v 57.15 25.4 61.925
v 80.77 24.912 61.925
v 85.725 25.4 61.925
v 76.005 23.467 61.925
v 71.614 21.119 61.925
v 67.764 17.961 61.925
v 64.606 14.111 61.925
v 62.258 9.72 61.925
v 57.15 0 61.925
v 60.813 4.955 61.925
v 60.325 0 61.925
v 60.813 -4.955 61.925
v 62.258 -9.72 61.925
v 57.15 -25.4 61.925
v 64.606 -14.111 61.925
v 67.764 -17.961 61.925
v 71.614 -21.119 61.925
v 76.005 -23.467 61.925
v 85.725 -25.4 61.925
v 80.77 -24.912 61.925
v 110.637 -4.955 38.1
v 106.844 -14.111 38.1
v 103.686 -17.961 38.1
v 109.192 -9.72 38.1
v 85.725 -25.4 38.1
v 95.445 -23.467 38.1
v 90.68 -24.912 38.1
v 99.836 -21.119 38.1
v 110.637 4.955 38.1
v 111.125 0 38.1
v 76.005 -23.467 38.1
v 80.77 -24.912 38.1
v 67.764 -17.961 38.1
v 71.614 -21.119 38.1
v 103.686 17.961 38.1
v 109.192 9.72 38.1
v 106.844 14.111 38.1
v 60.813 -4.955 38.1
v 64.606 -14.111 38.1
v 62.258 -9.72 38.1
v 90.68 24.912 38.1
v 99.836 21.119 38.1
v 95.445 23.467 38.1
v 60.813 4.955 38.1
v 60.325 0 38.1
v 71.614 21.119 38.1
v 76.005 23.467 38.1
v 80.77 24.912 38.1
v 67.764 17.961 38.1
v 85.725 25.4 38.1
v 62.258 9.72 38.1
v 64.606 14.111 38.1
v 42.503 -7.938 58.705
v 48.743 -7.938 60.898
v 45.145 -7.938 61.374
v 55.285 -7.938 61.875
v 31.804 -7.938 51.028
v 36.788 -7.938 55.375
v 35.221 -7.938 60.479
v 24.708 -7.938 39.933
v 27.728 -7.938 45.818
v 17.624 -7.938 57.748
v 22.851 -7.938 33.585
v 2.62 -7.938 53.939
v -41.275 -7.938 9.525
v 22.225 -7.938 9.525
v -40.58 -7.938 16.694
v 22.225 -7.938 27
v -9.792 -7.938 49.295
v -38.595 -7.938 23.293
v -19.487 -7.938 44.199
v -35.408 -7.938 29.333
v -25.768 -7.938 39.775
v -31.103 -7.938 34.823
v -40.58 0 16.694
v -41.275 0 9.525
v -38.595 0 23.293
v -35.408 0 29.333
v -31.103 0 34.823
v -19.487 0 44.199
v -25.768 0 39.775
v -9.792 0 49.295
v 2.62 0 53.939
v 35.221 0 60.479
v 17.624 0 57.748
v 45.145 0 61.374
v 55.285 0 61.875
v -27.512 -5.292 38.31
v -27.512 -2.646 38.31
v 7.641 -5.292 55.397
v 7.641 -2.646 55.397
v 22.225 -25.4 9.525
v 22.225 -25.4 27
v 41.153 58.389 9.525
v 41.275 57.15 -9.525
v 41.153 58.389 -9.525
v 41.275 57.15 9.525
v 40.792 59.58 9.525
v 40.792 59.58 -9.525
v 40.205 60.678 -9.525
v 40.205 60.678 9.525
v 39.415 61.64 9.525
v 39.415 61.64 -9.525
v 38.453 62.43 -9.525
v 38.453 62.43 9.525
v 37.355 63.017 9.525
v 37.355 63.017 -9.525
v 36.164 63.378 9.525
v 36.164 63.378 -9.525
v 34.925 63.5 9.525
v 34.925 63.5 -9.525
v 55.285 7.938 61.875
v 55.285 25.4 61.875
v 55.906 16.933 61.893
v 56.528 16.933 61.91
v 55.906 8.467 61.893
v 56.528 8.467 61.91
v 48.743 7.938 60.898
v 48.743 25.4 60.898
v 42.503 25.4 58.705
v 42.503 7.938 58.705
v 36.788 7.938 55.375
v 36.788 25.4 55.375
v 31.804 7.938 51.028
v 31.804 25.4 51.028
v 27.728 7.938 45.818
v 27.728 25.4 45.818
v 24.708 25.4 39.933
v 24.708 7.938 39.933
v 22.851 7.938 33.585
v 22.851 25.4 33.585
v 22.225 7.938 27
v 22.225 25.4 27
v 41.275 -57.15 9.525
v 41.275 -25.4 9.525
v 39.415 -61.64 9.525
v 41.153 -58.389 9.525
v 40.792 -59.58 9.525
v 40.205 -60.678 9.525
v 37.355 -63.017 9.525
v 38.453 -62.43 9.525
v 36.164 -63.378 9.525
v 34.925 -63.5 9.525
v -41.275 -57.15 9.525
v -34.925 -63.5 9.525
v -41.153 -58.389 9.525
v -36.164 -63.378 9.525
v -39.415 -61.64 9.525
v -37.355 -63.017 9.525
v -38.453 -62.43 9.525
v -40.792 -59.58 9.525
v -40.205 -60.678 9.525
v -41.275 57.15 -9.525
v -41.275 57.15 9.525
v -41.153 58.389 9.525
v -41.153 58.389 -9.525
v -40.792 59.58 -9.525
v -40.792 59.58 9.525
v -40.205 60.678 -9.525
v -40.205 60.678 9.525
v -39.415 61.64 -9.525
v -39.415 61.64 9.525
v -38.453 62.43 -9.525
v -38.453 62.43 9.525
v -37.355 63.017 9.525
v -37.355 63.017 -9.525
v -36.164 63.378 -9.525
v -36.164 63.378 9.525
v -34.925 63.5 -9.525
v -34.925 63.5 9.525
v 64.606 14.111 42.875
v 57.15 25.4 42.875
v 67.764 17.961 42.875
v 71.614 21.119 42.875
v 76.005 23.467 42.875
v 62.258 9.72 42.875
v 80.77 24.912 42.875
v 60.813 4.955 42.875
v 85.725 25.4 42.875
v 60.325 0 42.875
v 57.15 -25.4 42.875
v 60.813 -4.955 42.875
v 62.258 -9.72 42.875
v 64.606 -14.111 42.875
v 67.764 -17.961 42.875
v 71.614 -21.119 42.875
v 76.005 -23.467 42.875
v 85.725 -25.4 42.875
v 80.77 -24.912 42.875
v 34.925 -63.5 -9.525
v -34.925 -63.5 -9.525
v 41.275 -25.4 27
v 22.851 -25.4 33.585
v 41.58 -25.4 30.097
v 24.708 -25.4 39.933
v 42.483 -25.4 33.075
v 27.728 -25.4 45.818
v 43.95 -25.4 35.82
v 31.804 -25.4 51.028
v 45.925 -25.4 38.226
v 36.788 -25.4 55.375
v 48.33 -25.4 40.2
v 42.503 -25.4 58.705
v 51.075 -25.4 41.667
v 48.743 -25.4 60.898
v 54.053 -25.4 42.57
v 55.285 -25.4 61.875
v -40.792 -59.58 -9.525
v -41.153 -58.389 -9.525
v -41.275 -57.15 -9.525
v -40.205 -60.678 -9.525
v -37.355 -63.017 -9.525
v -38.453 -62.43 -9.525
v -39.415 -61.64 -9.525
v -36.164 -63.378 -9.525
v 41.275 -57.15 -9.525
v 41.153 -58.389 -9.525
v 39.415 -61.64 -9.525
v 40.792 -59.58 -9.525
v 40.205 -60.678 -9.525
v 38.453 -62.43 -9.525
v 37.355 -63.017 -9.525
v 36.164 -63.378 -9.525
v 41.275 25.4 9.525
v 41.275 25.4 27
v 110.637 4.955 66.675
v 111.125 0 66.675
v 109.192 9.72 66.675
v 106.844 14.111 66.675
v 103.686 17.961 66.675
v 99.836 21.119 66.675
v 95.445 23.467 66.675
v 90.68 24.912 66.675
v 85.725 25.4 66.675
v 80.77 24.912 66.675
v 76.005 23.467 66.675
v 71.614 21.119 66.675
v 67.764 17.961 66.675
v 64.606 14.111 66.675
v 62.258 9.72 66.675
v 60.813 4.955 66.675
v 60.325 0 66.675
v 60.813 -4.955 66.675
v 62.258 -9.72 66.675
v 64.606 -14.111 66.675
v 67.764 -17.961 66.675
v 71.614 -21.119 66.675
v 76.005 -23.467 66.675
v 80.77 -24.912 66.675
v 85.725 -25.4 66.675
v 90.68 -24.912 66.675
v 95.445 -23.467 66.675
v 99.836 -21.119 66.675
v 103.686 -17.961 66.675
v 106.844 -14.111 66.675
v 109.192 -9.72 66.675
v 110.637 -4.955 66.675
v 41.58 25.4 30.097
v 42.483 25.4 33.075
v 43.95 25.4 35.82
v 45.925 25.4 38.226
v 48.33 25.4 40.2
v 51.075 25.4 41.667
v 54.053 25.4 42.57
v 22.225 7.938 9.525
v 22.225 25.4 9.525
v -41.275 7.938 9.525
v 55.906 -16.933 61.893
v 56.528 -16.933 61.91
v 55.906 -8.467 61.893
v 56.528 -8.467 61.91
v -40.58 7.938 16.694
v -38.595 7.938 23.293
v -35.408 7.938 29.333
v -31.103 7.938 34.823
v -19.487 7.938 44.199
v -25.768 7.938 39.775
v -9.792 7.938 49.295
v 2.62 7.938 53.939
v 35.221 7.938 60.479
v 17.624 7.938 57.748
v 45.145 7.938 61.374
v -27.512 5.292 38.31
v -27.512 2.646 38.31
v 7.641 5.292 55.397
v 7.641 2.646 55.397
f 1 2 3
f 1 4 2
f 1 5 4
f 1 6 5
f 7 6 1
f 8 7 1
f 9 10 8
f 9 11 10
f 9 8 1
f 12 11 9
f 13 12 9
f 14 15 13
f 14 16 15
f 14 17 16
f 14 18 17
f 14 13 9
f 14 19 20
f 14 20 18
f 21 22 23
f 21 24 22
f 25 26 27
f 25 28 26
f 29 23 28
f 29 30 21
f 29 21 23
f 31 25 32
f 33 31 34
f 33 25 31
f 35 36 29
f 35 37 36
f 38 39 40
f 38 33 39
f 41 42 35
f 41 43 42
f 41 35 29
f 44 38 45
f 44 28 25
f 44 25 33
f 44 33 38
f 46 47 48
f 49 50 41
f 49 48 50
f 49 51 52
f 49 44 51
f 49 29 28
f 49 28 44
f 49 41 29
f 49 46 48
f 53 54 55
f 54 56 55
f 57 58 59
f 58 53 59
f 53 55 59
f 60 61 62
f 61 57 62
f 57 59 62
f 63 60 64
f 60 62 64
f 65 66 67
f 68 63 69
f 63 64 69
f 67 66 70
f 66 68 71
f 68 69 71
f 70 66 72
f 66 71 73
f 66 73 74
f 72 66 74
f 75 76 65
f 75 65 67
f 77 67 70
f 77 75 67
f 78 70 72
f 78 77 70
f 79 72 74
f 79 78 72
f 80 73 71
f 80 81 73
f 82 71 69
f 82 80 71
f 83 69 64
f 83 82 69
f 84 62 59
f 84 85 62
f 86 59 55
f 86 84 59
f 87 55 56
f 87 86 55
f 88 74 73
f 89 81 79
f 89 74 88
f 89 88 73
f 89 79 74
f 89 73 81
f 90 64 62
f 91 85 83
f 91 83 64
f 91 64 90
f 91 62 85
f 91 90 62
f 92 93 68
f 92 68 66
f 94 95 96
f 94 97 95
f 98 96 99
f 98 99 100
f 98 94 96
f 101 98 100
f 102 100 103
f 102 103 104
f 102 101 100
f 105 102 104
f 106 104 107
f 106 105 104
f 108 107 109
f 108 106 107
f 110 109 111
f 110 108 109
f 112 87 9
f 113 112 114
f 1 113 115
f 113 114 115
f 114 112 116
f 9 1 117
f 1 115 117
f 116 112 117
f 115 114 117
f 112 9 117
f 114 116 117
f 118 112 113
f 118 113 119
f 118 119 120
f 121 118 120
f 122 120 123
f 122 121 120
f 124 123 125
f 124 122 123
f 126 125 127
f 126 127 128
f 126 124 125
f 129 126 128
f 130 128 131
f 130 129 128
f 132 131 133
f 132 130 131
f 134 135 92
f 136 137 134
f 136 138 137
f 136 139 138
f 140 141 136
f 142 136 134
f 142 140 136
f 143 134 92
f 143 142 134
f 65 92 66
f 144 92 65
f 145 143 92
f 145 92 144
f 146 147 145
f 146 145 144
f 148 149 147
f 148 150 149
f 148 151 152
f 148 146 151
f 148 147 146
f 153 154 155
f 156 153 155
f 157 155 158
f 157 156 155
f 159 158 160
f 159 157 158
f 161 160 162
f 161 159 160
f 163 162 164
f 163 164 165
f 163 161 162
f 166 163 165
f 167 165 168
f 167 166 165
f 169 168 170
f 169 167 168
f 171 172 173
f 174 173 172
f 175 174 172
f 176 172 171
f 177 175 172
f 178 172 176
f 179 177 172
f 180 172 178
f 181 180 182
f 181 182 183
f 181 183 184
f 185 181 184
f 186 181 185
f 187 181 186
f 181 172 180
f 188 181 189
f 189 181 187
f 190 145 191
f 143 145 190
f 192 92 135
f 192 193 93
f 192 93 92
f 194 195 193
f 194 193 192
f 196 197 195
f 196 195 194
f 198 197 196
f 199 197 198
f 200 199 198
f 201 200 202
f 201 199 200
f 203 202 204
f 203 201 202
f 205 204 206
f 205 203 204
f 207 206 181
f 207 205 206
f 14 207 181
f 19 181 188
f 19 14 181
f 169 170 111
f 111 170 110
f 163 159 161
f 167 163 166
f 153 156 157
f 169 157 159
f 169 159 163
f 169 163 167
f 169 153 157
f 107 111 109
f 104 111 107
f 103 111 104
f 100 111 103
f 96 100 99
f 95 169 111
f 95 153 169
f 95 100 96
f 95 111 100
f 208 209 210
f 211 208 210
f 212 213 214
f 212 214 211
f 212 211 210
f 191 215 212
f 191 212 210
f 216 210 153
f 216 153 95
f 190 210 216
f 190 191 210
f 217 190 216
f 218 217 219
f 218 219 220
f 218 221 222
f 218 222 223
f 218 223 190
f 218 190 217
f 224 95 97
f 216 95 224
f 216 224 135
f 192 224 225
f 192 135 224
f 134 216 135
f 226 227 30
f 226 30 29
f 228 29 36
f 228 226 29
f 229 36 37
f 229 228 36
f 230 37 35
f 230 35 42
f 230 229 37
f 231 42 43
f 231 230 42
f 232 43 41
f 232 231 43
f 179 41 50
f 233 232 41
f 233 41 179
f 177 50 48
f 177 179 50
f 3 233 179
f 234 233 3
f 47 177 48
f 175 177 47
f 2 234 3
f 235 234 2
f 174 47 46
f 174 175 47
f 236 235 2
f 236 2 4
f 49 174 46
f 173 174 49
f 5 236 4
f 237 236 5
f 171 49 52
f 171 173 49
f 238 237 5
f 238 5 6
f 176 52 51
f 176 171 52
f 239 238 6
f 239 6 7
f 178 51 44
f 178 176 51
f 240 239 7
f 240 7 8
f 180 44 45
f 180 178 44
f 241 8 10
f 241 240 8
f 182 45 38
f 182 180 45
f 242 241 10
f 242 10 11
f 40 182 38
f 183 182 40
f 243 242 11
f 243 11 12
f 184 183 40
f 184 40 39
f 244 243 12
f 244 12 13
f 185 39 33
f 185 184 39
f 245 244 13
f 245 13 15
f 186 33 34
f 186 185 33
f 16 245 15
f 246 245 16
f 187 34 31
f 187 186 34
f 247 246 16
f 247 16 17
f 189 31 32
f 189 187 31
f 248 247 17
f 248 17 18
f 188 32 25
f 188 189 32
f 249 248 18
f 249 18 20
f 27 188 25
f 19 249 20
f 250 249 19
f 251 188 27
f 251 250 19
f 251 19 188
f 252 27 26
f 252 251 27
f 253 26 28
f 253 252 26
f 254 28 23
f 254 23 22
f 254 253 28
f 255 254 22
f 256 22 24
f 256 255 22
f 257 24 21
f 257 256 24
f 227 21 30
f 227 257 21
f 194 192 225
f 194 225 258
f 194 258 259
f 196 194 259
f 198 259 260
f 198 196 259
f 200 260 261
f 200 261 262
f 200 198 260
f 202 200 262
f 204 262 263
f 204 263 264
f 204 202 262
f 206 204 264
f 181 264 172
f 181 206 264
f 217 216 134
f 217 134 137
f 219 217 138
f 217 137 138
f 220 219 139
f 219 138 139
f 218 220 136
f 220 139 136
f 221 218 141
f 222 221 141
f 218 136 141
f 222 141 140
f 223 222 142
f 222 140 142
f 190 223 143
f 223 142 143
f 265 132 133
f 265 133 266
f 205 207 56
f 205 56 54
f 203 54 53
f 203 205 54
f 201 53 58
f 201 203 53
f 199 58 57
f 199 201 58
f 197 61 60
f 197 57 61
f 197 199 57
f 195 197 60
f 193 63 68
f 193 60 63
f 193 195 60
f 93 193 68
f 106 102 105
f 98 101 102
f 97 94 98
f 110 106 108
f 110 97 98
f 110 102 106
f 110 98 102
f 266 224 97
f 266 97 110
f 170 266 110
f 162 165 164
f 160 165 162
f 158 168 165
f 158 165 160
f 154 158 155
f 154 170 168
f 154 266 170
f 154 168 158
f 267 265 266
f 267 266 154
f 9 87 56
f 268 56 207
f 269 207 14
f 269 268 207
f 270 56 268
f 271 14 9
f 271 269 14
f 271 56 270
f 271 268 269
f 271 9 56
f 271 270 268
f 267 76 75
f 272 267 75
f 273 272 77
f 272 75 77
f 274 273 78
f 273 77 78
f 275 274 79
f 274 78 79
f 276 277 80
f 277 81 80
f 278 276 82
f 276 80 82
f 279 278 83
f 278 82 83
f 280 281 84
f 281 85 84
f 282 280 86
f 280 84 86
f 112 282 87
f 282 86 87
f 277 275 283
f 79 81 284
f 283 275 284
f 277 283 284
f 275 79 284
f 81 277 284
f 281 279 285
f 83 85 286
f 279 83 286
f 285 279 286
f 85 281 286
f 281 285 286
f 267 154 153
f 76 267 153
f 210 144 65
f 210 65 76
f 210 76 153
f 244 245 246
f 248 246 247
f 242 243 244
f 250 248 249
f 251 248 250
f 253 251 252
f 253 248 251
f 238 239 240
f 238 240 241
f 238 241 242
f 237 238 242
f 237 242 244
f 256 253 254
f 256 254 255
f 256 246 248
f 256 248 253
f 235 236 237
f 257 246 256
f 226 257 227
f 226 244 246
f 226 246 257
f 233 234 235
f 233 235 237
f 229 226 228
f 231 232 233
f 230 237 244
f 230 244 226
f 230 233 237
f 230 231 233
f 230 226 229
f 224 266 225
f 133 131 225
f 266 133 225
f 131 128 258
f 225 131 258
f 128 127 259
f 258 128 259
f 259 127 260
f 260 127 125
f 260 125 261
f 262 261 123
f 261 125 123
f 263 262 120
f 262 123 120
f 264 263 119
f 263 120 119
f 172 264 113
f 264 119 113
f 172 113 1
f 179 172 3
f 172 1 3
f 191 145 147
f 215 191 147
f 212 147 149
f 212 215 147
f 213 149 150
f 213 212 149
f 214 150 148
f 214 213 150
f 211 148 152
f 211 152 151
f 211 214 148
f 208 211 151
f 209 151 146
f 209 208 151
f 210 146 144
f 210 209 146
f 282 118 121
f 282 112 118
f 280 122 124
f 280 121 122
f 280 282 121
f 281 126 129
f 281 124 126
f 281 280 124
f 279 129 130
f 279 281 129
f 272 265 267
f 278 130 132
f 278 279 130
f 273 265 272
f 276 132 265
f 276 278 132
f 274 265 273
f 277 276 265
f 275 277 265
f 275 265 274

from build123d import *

# Parameters (mm, degrees)
F1_DEPTH = 63.5
F2_DEPTH = 25.4
F3_DEPTH = 7.9375
F5_R     = 6.35


with BuildPart() as f1:
    # F0 (on Front) → F1 (new body, symmetric)
    with BuildSketch(Plane.XZ):
        Polygon((-41.275, 9.525), (-41.275, -9.525), (41.275, -9.525), (41.275, 9.525), (22.225, 9.525), align=None)
    extrude(amount=F1_DEPTH, both=True)

    # F0 (on Front) → F2 (join, symmetric)
    with BuildSketch(Plane.XZ):
        with BuildLine():
            Line((22.225, 9.525), (41.275, 9.525))
            Line((41.275, 9.525), (41.275, 27.0002))
            ThreePointArc((41.275, 27.0002), (45.9246798487, 38.2255201513), (57.15, 42.8752))
            Line((57.15, 42.8752), (60.325, 42.8752))
            Line((60.325, 42.8752), (60.325, 61.9252))
            Line((60.325, 61.9252), (57.15, 61.9252))
            add(Edge.make_bspline(
                [(55.2851476574, 61.8753767127), (55.9059880343, 61.8941041264), (56.5276296664, 61.9107089301), (57.15, 61.9252)],
                knots=[110.161512309, 110.161512309, 110.161512309, 110.161512309, 111.5045361635, 111.5045361635, 111.5045361635, 111.5045361635], degree=3))
            ThreePointArc((55.2851476574, 61.8753767127), (31.8035446949, 51.0275350263), (22.225, 27.0002))
            Line((22.225, 27.0002), (22.225, 9.525))
        make_face()
        Polygon((75.3291722601, 61.9252), (60.325, 61.9252), (60.325, 42.8752), (75.3291722601, 42.8752), (85.725, 42.8752), (85.725, 61.9252), align=None)
    extrude(amount=F2_DEPTH, both=True)

    # F0 (on Front) → F3 (join, symmetric)
    with BuildSketch(Plane.XZ):
        with BuildLine():
            add(Edge.make_bspline(
                [(-41.275, 9.525), (-41.1727746696, 44.5220155957), (4.3607246911, 60.3392608693), (55.2851476574, 61.8753767127)],
                knots=[0, 0, 0, 0, 110.161512309, 110.161512309, 110.161512309, 110.161512309], degree=3))
            Line((-41.275, 9.525), (22.225, 9.525))
            Line((22.225, 9.525), (22.225, 27.0002))
            ThreePointArc((22.225, 27.0002), (31.8035446949, 51.0275350263), (55.2851476574, 61.8753767127))
        make_face()
    extrude(amount=F3_DEPTH, both=True)

    # F0 (on Front) → F4 (revolve)
    with BuildSketch(Plane.XZ):
        Polygon((111.125, 66.675), (85.725, 66.675), (85.725, 61.9252), (85.725, 42.8752), (85.725, 38.1), (111.125, 38.1), align=None)
    revolve(axis=Axis((85.725, 0, 52.3875), (0, 0, 1)))

    # F5
    f5_edges = [f1.edges().sort_by_distance(p)[0] for p in [
        (41.275, -63.5, 0),
        (-41.275, -63.5, 0),
        (41.275, 63.5, 0),
        (-41.275, 63.5, 0),
    ]]
    fillet(f5_edges, radius=F5_R)


solid = f1.part
